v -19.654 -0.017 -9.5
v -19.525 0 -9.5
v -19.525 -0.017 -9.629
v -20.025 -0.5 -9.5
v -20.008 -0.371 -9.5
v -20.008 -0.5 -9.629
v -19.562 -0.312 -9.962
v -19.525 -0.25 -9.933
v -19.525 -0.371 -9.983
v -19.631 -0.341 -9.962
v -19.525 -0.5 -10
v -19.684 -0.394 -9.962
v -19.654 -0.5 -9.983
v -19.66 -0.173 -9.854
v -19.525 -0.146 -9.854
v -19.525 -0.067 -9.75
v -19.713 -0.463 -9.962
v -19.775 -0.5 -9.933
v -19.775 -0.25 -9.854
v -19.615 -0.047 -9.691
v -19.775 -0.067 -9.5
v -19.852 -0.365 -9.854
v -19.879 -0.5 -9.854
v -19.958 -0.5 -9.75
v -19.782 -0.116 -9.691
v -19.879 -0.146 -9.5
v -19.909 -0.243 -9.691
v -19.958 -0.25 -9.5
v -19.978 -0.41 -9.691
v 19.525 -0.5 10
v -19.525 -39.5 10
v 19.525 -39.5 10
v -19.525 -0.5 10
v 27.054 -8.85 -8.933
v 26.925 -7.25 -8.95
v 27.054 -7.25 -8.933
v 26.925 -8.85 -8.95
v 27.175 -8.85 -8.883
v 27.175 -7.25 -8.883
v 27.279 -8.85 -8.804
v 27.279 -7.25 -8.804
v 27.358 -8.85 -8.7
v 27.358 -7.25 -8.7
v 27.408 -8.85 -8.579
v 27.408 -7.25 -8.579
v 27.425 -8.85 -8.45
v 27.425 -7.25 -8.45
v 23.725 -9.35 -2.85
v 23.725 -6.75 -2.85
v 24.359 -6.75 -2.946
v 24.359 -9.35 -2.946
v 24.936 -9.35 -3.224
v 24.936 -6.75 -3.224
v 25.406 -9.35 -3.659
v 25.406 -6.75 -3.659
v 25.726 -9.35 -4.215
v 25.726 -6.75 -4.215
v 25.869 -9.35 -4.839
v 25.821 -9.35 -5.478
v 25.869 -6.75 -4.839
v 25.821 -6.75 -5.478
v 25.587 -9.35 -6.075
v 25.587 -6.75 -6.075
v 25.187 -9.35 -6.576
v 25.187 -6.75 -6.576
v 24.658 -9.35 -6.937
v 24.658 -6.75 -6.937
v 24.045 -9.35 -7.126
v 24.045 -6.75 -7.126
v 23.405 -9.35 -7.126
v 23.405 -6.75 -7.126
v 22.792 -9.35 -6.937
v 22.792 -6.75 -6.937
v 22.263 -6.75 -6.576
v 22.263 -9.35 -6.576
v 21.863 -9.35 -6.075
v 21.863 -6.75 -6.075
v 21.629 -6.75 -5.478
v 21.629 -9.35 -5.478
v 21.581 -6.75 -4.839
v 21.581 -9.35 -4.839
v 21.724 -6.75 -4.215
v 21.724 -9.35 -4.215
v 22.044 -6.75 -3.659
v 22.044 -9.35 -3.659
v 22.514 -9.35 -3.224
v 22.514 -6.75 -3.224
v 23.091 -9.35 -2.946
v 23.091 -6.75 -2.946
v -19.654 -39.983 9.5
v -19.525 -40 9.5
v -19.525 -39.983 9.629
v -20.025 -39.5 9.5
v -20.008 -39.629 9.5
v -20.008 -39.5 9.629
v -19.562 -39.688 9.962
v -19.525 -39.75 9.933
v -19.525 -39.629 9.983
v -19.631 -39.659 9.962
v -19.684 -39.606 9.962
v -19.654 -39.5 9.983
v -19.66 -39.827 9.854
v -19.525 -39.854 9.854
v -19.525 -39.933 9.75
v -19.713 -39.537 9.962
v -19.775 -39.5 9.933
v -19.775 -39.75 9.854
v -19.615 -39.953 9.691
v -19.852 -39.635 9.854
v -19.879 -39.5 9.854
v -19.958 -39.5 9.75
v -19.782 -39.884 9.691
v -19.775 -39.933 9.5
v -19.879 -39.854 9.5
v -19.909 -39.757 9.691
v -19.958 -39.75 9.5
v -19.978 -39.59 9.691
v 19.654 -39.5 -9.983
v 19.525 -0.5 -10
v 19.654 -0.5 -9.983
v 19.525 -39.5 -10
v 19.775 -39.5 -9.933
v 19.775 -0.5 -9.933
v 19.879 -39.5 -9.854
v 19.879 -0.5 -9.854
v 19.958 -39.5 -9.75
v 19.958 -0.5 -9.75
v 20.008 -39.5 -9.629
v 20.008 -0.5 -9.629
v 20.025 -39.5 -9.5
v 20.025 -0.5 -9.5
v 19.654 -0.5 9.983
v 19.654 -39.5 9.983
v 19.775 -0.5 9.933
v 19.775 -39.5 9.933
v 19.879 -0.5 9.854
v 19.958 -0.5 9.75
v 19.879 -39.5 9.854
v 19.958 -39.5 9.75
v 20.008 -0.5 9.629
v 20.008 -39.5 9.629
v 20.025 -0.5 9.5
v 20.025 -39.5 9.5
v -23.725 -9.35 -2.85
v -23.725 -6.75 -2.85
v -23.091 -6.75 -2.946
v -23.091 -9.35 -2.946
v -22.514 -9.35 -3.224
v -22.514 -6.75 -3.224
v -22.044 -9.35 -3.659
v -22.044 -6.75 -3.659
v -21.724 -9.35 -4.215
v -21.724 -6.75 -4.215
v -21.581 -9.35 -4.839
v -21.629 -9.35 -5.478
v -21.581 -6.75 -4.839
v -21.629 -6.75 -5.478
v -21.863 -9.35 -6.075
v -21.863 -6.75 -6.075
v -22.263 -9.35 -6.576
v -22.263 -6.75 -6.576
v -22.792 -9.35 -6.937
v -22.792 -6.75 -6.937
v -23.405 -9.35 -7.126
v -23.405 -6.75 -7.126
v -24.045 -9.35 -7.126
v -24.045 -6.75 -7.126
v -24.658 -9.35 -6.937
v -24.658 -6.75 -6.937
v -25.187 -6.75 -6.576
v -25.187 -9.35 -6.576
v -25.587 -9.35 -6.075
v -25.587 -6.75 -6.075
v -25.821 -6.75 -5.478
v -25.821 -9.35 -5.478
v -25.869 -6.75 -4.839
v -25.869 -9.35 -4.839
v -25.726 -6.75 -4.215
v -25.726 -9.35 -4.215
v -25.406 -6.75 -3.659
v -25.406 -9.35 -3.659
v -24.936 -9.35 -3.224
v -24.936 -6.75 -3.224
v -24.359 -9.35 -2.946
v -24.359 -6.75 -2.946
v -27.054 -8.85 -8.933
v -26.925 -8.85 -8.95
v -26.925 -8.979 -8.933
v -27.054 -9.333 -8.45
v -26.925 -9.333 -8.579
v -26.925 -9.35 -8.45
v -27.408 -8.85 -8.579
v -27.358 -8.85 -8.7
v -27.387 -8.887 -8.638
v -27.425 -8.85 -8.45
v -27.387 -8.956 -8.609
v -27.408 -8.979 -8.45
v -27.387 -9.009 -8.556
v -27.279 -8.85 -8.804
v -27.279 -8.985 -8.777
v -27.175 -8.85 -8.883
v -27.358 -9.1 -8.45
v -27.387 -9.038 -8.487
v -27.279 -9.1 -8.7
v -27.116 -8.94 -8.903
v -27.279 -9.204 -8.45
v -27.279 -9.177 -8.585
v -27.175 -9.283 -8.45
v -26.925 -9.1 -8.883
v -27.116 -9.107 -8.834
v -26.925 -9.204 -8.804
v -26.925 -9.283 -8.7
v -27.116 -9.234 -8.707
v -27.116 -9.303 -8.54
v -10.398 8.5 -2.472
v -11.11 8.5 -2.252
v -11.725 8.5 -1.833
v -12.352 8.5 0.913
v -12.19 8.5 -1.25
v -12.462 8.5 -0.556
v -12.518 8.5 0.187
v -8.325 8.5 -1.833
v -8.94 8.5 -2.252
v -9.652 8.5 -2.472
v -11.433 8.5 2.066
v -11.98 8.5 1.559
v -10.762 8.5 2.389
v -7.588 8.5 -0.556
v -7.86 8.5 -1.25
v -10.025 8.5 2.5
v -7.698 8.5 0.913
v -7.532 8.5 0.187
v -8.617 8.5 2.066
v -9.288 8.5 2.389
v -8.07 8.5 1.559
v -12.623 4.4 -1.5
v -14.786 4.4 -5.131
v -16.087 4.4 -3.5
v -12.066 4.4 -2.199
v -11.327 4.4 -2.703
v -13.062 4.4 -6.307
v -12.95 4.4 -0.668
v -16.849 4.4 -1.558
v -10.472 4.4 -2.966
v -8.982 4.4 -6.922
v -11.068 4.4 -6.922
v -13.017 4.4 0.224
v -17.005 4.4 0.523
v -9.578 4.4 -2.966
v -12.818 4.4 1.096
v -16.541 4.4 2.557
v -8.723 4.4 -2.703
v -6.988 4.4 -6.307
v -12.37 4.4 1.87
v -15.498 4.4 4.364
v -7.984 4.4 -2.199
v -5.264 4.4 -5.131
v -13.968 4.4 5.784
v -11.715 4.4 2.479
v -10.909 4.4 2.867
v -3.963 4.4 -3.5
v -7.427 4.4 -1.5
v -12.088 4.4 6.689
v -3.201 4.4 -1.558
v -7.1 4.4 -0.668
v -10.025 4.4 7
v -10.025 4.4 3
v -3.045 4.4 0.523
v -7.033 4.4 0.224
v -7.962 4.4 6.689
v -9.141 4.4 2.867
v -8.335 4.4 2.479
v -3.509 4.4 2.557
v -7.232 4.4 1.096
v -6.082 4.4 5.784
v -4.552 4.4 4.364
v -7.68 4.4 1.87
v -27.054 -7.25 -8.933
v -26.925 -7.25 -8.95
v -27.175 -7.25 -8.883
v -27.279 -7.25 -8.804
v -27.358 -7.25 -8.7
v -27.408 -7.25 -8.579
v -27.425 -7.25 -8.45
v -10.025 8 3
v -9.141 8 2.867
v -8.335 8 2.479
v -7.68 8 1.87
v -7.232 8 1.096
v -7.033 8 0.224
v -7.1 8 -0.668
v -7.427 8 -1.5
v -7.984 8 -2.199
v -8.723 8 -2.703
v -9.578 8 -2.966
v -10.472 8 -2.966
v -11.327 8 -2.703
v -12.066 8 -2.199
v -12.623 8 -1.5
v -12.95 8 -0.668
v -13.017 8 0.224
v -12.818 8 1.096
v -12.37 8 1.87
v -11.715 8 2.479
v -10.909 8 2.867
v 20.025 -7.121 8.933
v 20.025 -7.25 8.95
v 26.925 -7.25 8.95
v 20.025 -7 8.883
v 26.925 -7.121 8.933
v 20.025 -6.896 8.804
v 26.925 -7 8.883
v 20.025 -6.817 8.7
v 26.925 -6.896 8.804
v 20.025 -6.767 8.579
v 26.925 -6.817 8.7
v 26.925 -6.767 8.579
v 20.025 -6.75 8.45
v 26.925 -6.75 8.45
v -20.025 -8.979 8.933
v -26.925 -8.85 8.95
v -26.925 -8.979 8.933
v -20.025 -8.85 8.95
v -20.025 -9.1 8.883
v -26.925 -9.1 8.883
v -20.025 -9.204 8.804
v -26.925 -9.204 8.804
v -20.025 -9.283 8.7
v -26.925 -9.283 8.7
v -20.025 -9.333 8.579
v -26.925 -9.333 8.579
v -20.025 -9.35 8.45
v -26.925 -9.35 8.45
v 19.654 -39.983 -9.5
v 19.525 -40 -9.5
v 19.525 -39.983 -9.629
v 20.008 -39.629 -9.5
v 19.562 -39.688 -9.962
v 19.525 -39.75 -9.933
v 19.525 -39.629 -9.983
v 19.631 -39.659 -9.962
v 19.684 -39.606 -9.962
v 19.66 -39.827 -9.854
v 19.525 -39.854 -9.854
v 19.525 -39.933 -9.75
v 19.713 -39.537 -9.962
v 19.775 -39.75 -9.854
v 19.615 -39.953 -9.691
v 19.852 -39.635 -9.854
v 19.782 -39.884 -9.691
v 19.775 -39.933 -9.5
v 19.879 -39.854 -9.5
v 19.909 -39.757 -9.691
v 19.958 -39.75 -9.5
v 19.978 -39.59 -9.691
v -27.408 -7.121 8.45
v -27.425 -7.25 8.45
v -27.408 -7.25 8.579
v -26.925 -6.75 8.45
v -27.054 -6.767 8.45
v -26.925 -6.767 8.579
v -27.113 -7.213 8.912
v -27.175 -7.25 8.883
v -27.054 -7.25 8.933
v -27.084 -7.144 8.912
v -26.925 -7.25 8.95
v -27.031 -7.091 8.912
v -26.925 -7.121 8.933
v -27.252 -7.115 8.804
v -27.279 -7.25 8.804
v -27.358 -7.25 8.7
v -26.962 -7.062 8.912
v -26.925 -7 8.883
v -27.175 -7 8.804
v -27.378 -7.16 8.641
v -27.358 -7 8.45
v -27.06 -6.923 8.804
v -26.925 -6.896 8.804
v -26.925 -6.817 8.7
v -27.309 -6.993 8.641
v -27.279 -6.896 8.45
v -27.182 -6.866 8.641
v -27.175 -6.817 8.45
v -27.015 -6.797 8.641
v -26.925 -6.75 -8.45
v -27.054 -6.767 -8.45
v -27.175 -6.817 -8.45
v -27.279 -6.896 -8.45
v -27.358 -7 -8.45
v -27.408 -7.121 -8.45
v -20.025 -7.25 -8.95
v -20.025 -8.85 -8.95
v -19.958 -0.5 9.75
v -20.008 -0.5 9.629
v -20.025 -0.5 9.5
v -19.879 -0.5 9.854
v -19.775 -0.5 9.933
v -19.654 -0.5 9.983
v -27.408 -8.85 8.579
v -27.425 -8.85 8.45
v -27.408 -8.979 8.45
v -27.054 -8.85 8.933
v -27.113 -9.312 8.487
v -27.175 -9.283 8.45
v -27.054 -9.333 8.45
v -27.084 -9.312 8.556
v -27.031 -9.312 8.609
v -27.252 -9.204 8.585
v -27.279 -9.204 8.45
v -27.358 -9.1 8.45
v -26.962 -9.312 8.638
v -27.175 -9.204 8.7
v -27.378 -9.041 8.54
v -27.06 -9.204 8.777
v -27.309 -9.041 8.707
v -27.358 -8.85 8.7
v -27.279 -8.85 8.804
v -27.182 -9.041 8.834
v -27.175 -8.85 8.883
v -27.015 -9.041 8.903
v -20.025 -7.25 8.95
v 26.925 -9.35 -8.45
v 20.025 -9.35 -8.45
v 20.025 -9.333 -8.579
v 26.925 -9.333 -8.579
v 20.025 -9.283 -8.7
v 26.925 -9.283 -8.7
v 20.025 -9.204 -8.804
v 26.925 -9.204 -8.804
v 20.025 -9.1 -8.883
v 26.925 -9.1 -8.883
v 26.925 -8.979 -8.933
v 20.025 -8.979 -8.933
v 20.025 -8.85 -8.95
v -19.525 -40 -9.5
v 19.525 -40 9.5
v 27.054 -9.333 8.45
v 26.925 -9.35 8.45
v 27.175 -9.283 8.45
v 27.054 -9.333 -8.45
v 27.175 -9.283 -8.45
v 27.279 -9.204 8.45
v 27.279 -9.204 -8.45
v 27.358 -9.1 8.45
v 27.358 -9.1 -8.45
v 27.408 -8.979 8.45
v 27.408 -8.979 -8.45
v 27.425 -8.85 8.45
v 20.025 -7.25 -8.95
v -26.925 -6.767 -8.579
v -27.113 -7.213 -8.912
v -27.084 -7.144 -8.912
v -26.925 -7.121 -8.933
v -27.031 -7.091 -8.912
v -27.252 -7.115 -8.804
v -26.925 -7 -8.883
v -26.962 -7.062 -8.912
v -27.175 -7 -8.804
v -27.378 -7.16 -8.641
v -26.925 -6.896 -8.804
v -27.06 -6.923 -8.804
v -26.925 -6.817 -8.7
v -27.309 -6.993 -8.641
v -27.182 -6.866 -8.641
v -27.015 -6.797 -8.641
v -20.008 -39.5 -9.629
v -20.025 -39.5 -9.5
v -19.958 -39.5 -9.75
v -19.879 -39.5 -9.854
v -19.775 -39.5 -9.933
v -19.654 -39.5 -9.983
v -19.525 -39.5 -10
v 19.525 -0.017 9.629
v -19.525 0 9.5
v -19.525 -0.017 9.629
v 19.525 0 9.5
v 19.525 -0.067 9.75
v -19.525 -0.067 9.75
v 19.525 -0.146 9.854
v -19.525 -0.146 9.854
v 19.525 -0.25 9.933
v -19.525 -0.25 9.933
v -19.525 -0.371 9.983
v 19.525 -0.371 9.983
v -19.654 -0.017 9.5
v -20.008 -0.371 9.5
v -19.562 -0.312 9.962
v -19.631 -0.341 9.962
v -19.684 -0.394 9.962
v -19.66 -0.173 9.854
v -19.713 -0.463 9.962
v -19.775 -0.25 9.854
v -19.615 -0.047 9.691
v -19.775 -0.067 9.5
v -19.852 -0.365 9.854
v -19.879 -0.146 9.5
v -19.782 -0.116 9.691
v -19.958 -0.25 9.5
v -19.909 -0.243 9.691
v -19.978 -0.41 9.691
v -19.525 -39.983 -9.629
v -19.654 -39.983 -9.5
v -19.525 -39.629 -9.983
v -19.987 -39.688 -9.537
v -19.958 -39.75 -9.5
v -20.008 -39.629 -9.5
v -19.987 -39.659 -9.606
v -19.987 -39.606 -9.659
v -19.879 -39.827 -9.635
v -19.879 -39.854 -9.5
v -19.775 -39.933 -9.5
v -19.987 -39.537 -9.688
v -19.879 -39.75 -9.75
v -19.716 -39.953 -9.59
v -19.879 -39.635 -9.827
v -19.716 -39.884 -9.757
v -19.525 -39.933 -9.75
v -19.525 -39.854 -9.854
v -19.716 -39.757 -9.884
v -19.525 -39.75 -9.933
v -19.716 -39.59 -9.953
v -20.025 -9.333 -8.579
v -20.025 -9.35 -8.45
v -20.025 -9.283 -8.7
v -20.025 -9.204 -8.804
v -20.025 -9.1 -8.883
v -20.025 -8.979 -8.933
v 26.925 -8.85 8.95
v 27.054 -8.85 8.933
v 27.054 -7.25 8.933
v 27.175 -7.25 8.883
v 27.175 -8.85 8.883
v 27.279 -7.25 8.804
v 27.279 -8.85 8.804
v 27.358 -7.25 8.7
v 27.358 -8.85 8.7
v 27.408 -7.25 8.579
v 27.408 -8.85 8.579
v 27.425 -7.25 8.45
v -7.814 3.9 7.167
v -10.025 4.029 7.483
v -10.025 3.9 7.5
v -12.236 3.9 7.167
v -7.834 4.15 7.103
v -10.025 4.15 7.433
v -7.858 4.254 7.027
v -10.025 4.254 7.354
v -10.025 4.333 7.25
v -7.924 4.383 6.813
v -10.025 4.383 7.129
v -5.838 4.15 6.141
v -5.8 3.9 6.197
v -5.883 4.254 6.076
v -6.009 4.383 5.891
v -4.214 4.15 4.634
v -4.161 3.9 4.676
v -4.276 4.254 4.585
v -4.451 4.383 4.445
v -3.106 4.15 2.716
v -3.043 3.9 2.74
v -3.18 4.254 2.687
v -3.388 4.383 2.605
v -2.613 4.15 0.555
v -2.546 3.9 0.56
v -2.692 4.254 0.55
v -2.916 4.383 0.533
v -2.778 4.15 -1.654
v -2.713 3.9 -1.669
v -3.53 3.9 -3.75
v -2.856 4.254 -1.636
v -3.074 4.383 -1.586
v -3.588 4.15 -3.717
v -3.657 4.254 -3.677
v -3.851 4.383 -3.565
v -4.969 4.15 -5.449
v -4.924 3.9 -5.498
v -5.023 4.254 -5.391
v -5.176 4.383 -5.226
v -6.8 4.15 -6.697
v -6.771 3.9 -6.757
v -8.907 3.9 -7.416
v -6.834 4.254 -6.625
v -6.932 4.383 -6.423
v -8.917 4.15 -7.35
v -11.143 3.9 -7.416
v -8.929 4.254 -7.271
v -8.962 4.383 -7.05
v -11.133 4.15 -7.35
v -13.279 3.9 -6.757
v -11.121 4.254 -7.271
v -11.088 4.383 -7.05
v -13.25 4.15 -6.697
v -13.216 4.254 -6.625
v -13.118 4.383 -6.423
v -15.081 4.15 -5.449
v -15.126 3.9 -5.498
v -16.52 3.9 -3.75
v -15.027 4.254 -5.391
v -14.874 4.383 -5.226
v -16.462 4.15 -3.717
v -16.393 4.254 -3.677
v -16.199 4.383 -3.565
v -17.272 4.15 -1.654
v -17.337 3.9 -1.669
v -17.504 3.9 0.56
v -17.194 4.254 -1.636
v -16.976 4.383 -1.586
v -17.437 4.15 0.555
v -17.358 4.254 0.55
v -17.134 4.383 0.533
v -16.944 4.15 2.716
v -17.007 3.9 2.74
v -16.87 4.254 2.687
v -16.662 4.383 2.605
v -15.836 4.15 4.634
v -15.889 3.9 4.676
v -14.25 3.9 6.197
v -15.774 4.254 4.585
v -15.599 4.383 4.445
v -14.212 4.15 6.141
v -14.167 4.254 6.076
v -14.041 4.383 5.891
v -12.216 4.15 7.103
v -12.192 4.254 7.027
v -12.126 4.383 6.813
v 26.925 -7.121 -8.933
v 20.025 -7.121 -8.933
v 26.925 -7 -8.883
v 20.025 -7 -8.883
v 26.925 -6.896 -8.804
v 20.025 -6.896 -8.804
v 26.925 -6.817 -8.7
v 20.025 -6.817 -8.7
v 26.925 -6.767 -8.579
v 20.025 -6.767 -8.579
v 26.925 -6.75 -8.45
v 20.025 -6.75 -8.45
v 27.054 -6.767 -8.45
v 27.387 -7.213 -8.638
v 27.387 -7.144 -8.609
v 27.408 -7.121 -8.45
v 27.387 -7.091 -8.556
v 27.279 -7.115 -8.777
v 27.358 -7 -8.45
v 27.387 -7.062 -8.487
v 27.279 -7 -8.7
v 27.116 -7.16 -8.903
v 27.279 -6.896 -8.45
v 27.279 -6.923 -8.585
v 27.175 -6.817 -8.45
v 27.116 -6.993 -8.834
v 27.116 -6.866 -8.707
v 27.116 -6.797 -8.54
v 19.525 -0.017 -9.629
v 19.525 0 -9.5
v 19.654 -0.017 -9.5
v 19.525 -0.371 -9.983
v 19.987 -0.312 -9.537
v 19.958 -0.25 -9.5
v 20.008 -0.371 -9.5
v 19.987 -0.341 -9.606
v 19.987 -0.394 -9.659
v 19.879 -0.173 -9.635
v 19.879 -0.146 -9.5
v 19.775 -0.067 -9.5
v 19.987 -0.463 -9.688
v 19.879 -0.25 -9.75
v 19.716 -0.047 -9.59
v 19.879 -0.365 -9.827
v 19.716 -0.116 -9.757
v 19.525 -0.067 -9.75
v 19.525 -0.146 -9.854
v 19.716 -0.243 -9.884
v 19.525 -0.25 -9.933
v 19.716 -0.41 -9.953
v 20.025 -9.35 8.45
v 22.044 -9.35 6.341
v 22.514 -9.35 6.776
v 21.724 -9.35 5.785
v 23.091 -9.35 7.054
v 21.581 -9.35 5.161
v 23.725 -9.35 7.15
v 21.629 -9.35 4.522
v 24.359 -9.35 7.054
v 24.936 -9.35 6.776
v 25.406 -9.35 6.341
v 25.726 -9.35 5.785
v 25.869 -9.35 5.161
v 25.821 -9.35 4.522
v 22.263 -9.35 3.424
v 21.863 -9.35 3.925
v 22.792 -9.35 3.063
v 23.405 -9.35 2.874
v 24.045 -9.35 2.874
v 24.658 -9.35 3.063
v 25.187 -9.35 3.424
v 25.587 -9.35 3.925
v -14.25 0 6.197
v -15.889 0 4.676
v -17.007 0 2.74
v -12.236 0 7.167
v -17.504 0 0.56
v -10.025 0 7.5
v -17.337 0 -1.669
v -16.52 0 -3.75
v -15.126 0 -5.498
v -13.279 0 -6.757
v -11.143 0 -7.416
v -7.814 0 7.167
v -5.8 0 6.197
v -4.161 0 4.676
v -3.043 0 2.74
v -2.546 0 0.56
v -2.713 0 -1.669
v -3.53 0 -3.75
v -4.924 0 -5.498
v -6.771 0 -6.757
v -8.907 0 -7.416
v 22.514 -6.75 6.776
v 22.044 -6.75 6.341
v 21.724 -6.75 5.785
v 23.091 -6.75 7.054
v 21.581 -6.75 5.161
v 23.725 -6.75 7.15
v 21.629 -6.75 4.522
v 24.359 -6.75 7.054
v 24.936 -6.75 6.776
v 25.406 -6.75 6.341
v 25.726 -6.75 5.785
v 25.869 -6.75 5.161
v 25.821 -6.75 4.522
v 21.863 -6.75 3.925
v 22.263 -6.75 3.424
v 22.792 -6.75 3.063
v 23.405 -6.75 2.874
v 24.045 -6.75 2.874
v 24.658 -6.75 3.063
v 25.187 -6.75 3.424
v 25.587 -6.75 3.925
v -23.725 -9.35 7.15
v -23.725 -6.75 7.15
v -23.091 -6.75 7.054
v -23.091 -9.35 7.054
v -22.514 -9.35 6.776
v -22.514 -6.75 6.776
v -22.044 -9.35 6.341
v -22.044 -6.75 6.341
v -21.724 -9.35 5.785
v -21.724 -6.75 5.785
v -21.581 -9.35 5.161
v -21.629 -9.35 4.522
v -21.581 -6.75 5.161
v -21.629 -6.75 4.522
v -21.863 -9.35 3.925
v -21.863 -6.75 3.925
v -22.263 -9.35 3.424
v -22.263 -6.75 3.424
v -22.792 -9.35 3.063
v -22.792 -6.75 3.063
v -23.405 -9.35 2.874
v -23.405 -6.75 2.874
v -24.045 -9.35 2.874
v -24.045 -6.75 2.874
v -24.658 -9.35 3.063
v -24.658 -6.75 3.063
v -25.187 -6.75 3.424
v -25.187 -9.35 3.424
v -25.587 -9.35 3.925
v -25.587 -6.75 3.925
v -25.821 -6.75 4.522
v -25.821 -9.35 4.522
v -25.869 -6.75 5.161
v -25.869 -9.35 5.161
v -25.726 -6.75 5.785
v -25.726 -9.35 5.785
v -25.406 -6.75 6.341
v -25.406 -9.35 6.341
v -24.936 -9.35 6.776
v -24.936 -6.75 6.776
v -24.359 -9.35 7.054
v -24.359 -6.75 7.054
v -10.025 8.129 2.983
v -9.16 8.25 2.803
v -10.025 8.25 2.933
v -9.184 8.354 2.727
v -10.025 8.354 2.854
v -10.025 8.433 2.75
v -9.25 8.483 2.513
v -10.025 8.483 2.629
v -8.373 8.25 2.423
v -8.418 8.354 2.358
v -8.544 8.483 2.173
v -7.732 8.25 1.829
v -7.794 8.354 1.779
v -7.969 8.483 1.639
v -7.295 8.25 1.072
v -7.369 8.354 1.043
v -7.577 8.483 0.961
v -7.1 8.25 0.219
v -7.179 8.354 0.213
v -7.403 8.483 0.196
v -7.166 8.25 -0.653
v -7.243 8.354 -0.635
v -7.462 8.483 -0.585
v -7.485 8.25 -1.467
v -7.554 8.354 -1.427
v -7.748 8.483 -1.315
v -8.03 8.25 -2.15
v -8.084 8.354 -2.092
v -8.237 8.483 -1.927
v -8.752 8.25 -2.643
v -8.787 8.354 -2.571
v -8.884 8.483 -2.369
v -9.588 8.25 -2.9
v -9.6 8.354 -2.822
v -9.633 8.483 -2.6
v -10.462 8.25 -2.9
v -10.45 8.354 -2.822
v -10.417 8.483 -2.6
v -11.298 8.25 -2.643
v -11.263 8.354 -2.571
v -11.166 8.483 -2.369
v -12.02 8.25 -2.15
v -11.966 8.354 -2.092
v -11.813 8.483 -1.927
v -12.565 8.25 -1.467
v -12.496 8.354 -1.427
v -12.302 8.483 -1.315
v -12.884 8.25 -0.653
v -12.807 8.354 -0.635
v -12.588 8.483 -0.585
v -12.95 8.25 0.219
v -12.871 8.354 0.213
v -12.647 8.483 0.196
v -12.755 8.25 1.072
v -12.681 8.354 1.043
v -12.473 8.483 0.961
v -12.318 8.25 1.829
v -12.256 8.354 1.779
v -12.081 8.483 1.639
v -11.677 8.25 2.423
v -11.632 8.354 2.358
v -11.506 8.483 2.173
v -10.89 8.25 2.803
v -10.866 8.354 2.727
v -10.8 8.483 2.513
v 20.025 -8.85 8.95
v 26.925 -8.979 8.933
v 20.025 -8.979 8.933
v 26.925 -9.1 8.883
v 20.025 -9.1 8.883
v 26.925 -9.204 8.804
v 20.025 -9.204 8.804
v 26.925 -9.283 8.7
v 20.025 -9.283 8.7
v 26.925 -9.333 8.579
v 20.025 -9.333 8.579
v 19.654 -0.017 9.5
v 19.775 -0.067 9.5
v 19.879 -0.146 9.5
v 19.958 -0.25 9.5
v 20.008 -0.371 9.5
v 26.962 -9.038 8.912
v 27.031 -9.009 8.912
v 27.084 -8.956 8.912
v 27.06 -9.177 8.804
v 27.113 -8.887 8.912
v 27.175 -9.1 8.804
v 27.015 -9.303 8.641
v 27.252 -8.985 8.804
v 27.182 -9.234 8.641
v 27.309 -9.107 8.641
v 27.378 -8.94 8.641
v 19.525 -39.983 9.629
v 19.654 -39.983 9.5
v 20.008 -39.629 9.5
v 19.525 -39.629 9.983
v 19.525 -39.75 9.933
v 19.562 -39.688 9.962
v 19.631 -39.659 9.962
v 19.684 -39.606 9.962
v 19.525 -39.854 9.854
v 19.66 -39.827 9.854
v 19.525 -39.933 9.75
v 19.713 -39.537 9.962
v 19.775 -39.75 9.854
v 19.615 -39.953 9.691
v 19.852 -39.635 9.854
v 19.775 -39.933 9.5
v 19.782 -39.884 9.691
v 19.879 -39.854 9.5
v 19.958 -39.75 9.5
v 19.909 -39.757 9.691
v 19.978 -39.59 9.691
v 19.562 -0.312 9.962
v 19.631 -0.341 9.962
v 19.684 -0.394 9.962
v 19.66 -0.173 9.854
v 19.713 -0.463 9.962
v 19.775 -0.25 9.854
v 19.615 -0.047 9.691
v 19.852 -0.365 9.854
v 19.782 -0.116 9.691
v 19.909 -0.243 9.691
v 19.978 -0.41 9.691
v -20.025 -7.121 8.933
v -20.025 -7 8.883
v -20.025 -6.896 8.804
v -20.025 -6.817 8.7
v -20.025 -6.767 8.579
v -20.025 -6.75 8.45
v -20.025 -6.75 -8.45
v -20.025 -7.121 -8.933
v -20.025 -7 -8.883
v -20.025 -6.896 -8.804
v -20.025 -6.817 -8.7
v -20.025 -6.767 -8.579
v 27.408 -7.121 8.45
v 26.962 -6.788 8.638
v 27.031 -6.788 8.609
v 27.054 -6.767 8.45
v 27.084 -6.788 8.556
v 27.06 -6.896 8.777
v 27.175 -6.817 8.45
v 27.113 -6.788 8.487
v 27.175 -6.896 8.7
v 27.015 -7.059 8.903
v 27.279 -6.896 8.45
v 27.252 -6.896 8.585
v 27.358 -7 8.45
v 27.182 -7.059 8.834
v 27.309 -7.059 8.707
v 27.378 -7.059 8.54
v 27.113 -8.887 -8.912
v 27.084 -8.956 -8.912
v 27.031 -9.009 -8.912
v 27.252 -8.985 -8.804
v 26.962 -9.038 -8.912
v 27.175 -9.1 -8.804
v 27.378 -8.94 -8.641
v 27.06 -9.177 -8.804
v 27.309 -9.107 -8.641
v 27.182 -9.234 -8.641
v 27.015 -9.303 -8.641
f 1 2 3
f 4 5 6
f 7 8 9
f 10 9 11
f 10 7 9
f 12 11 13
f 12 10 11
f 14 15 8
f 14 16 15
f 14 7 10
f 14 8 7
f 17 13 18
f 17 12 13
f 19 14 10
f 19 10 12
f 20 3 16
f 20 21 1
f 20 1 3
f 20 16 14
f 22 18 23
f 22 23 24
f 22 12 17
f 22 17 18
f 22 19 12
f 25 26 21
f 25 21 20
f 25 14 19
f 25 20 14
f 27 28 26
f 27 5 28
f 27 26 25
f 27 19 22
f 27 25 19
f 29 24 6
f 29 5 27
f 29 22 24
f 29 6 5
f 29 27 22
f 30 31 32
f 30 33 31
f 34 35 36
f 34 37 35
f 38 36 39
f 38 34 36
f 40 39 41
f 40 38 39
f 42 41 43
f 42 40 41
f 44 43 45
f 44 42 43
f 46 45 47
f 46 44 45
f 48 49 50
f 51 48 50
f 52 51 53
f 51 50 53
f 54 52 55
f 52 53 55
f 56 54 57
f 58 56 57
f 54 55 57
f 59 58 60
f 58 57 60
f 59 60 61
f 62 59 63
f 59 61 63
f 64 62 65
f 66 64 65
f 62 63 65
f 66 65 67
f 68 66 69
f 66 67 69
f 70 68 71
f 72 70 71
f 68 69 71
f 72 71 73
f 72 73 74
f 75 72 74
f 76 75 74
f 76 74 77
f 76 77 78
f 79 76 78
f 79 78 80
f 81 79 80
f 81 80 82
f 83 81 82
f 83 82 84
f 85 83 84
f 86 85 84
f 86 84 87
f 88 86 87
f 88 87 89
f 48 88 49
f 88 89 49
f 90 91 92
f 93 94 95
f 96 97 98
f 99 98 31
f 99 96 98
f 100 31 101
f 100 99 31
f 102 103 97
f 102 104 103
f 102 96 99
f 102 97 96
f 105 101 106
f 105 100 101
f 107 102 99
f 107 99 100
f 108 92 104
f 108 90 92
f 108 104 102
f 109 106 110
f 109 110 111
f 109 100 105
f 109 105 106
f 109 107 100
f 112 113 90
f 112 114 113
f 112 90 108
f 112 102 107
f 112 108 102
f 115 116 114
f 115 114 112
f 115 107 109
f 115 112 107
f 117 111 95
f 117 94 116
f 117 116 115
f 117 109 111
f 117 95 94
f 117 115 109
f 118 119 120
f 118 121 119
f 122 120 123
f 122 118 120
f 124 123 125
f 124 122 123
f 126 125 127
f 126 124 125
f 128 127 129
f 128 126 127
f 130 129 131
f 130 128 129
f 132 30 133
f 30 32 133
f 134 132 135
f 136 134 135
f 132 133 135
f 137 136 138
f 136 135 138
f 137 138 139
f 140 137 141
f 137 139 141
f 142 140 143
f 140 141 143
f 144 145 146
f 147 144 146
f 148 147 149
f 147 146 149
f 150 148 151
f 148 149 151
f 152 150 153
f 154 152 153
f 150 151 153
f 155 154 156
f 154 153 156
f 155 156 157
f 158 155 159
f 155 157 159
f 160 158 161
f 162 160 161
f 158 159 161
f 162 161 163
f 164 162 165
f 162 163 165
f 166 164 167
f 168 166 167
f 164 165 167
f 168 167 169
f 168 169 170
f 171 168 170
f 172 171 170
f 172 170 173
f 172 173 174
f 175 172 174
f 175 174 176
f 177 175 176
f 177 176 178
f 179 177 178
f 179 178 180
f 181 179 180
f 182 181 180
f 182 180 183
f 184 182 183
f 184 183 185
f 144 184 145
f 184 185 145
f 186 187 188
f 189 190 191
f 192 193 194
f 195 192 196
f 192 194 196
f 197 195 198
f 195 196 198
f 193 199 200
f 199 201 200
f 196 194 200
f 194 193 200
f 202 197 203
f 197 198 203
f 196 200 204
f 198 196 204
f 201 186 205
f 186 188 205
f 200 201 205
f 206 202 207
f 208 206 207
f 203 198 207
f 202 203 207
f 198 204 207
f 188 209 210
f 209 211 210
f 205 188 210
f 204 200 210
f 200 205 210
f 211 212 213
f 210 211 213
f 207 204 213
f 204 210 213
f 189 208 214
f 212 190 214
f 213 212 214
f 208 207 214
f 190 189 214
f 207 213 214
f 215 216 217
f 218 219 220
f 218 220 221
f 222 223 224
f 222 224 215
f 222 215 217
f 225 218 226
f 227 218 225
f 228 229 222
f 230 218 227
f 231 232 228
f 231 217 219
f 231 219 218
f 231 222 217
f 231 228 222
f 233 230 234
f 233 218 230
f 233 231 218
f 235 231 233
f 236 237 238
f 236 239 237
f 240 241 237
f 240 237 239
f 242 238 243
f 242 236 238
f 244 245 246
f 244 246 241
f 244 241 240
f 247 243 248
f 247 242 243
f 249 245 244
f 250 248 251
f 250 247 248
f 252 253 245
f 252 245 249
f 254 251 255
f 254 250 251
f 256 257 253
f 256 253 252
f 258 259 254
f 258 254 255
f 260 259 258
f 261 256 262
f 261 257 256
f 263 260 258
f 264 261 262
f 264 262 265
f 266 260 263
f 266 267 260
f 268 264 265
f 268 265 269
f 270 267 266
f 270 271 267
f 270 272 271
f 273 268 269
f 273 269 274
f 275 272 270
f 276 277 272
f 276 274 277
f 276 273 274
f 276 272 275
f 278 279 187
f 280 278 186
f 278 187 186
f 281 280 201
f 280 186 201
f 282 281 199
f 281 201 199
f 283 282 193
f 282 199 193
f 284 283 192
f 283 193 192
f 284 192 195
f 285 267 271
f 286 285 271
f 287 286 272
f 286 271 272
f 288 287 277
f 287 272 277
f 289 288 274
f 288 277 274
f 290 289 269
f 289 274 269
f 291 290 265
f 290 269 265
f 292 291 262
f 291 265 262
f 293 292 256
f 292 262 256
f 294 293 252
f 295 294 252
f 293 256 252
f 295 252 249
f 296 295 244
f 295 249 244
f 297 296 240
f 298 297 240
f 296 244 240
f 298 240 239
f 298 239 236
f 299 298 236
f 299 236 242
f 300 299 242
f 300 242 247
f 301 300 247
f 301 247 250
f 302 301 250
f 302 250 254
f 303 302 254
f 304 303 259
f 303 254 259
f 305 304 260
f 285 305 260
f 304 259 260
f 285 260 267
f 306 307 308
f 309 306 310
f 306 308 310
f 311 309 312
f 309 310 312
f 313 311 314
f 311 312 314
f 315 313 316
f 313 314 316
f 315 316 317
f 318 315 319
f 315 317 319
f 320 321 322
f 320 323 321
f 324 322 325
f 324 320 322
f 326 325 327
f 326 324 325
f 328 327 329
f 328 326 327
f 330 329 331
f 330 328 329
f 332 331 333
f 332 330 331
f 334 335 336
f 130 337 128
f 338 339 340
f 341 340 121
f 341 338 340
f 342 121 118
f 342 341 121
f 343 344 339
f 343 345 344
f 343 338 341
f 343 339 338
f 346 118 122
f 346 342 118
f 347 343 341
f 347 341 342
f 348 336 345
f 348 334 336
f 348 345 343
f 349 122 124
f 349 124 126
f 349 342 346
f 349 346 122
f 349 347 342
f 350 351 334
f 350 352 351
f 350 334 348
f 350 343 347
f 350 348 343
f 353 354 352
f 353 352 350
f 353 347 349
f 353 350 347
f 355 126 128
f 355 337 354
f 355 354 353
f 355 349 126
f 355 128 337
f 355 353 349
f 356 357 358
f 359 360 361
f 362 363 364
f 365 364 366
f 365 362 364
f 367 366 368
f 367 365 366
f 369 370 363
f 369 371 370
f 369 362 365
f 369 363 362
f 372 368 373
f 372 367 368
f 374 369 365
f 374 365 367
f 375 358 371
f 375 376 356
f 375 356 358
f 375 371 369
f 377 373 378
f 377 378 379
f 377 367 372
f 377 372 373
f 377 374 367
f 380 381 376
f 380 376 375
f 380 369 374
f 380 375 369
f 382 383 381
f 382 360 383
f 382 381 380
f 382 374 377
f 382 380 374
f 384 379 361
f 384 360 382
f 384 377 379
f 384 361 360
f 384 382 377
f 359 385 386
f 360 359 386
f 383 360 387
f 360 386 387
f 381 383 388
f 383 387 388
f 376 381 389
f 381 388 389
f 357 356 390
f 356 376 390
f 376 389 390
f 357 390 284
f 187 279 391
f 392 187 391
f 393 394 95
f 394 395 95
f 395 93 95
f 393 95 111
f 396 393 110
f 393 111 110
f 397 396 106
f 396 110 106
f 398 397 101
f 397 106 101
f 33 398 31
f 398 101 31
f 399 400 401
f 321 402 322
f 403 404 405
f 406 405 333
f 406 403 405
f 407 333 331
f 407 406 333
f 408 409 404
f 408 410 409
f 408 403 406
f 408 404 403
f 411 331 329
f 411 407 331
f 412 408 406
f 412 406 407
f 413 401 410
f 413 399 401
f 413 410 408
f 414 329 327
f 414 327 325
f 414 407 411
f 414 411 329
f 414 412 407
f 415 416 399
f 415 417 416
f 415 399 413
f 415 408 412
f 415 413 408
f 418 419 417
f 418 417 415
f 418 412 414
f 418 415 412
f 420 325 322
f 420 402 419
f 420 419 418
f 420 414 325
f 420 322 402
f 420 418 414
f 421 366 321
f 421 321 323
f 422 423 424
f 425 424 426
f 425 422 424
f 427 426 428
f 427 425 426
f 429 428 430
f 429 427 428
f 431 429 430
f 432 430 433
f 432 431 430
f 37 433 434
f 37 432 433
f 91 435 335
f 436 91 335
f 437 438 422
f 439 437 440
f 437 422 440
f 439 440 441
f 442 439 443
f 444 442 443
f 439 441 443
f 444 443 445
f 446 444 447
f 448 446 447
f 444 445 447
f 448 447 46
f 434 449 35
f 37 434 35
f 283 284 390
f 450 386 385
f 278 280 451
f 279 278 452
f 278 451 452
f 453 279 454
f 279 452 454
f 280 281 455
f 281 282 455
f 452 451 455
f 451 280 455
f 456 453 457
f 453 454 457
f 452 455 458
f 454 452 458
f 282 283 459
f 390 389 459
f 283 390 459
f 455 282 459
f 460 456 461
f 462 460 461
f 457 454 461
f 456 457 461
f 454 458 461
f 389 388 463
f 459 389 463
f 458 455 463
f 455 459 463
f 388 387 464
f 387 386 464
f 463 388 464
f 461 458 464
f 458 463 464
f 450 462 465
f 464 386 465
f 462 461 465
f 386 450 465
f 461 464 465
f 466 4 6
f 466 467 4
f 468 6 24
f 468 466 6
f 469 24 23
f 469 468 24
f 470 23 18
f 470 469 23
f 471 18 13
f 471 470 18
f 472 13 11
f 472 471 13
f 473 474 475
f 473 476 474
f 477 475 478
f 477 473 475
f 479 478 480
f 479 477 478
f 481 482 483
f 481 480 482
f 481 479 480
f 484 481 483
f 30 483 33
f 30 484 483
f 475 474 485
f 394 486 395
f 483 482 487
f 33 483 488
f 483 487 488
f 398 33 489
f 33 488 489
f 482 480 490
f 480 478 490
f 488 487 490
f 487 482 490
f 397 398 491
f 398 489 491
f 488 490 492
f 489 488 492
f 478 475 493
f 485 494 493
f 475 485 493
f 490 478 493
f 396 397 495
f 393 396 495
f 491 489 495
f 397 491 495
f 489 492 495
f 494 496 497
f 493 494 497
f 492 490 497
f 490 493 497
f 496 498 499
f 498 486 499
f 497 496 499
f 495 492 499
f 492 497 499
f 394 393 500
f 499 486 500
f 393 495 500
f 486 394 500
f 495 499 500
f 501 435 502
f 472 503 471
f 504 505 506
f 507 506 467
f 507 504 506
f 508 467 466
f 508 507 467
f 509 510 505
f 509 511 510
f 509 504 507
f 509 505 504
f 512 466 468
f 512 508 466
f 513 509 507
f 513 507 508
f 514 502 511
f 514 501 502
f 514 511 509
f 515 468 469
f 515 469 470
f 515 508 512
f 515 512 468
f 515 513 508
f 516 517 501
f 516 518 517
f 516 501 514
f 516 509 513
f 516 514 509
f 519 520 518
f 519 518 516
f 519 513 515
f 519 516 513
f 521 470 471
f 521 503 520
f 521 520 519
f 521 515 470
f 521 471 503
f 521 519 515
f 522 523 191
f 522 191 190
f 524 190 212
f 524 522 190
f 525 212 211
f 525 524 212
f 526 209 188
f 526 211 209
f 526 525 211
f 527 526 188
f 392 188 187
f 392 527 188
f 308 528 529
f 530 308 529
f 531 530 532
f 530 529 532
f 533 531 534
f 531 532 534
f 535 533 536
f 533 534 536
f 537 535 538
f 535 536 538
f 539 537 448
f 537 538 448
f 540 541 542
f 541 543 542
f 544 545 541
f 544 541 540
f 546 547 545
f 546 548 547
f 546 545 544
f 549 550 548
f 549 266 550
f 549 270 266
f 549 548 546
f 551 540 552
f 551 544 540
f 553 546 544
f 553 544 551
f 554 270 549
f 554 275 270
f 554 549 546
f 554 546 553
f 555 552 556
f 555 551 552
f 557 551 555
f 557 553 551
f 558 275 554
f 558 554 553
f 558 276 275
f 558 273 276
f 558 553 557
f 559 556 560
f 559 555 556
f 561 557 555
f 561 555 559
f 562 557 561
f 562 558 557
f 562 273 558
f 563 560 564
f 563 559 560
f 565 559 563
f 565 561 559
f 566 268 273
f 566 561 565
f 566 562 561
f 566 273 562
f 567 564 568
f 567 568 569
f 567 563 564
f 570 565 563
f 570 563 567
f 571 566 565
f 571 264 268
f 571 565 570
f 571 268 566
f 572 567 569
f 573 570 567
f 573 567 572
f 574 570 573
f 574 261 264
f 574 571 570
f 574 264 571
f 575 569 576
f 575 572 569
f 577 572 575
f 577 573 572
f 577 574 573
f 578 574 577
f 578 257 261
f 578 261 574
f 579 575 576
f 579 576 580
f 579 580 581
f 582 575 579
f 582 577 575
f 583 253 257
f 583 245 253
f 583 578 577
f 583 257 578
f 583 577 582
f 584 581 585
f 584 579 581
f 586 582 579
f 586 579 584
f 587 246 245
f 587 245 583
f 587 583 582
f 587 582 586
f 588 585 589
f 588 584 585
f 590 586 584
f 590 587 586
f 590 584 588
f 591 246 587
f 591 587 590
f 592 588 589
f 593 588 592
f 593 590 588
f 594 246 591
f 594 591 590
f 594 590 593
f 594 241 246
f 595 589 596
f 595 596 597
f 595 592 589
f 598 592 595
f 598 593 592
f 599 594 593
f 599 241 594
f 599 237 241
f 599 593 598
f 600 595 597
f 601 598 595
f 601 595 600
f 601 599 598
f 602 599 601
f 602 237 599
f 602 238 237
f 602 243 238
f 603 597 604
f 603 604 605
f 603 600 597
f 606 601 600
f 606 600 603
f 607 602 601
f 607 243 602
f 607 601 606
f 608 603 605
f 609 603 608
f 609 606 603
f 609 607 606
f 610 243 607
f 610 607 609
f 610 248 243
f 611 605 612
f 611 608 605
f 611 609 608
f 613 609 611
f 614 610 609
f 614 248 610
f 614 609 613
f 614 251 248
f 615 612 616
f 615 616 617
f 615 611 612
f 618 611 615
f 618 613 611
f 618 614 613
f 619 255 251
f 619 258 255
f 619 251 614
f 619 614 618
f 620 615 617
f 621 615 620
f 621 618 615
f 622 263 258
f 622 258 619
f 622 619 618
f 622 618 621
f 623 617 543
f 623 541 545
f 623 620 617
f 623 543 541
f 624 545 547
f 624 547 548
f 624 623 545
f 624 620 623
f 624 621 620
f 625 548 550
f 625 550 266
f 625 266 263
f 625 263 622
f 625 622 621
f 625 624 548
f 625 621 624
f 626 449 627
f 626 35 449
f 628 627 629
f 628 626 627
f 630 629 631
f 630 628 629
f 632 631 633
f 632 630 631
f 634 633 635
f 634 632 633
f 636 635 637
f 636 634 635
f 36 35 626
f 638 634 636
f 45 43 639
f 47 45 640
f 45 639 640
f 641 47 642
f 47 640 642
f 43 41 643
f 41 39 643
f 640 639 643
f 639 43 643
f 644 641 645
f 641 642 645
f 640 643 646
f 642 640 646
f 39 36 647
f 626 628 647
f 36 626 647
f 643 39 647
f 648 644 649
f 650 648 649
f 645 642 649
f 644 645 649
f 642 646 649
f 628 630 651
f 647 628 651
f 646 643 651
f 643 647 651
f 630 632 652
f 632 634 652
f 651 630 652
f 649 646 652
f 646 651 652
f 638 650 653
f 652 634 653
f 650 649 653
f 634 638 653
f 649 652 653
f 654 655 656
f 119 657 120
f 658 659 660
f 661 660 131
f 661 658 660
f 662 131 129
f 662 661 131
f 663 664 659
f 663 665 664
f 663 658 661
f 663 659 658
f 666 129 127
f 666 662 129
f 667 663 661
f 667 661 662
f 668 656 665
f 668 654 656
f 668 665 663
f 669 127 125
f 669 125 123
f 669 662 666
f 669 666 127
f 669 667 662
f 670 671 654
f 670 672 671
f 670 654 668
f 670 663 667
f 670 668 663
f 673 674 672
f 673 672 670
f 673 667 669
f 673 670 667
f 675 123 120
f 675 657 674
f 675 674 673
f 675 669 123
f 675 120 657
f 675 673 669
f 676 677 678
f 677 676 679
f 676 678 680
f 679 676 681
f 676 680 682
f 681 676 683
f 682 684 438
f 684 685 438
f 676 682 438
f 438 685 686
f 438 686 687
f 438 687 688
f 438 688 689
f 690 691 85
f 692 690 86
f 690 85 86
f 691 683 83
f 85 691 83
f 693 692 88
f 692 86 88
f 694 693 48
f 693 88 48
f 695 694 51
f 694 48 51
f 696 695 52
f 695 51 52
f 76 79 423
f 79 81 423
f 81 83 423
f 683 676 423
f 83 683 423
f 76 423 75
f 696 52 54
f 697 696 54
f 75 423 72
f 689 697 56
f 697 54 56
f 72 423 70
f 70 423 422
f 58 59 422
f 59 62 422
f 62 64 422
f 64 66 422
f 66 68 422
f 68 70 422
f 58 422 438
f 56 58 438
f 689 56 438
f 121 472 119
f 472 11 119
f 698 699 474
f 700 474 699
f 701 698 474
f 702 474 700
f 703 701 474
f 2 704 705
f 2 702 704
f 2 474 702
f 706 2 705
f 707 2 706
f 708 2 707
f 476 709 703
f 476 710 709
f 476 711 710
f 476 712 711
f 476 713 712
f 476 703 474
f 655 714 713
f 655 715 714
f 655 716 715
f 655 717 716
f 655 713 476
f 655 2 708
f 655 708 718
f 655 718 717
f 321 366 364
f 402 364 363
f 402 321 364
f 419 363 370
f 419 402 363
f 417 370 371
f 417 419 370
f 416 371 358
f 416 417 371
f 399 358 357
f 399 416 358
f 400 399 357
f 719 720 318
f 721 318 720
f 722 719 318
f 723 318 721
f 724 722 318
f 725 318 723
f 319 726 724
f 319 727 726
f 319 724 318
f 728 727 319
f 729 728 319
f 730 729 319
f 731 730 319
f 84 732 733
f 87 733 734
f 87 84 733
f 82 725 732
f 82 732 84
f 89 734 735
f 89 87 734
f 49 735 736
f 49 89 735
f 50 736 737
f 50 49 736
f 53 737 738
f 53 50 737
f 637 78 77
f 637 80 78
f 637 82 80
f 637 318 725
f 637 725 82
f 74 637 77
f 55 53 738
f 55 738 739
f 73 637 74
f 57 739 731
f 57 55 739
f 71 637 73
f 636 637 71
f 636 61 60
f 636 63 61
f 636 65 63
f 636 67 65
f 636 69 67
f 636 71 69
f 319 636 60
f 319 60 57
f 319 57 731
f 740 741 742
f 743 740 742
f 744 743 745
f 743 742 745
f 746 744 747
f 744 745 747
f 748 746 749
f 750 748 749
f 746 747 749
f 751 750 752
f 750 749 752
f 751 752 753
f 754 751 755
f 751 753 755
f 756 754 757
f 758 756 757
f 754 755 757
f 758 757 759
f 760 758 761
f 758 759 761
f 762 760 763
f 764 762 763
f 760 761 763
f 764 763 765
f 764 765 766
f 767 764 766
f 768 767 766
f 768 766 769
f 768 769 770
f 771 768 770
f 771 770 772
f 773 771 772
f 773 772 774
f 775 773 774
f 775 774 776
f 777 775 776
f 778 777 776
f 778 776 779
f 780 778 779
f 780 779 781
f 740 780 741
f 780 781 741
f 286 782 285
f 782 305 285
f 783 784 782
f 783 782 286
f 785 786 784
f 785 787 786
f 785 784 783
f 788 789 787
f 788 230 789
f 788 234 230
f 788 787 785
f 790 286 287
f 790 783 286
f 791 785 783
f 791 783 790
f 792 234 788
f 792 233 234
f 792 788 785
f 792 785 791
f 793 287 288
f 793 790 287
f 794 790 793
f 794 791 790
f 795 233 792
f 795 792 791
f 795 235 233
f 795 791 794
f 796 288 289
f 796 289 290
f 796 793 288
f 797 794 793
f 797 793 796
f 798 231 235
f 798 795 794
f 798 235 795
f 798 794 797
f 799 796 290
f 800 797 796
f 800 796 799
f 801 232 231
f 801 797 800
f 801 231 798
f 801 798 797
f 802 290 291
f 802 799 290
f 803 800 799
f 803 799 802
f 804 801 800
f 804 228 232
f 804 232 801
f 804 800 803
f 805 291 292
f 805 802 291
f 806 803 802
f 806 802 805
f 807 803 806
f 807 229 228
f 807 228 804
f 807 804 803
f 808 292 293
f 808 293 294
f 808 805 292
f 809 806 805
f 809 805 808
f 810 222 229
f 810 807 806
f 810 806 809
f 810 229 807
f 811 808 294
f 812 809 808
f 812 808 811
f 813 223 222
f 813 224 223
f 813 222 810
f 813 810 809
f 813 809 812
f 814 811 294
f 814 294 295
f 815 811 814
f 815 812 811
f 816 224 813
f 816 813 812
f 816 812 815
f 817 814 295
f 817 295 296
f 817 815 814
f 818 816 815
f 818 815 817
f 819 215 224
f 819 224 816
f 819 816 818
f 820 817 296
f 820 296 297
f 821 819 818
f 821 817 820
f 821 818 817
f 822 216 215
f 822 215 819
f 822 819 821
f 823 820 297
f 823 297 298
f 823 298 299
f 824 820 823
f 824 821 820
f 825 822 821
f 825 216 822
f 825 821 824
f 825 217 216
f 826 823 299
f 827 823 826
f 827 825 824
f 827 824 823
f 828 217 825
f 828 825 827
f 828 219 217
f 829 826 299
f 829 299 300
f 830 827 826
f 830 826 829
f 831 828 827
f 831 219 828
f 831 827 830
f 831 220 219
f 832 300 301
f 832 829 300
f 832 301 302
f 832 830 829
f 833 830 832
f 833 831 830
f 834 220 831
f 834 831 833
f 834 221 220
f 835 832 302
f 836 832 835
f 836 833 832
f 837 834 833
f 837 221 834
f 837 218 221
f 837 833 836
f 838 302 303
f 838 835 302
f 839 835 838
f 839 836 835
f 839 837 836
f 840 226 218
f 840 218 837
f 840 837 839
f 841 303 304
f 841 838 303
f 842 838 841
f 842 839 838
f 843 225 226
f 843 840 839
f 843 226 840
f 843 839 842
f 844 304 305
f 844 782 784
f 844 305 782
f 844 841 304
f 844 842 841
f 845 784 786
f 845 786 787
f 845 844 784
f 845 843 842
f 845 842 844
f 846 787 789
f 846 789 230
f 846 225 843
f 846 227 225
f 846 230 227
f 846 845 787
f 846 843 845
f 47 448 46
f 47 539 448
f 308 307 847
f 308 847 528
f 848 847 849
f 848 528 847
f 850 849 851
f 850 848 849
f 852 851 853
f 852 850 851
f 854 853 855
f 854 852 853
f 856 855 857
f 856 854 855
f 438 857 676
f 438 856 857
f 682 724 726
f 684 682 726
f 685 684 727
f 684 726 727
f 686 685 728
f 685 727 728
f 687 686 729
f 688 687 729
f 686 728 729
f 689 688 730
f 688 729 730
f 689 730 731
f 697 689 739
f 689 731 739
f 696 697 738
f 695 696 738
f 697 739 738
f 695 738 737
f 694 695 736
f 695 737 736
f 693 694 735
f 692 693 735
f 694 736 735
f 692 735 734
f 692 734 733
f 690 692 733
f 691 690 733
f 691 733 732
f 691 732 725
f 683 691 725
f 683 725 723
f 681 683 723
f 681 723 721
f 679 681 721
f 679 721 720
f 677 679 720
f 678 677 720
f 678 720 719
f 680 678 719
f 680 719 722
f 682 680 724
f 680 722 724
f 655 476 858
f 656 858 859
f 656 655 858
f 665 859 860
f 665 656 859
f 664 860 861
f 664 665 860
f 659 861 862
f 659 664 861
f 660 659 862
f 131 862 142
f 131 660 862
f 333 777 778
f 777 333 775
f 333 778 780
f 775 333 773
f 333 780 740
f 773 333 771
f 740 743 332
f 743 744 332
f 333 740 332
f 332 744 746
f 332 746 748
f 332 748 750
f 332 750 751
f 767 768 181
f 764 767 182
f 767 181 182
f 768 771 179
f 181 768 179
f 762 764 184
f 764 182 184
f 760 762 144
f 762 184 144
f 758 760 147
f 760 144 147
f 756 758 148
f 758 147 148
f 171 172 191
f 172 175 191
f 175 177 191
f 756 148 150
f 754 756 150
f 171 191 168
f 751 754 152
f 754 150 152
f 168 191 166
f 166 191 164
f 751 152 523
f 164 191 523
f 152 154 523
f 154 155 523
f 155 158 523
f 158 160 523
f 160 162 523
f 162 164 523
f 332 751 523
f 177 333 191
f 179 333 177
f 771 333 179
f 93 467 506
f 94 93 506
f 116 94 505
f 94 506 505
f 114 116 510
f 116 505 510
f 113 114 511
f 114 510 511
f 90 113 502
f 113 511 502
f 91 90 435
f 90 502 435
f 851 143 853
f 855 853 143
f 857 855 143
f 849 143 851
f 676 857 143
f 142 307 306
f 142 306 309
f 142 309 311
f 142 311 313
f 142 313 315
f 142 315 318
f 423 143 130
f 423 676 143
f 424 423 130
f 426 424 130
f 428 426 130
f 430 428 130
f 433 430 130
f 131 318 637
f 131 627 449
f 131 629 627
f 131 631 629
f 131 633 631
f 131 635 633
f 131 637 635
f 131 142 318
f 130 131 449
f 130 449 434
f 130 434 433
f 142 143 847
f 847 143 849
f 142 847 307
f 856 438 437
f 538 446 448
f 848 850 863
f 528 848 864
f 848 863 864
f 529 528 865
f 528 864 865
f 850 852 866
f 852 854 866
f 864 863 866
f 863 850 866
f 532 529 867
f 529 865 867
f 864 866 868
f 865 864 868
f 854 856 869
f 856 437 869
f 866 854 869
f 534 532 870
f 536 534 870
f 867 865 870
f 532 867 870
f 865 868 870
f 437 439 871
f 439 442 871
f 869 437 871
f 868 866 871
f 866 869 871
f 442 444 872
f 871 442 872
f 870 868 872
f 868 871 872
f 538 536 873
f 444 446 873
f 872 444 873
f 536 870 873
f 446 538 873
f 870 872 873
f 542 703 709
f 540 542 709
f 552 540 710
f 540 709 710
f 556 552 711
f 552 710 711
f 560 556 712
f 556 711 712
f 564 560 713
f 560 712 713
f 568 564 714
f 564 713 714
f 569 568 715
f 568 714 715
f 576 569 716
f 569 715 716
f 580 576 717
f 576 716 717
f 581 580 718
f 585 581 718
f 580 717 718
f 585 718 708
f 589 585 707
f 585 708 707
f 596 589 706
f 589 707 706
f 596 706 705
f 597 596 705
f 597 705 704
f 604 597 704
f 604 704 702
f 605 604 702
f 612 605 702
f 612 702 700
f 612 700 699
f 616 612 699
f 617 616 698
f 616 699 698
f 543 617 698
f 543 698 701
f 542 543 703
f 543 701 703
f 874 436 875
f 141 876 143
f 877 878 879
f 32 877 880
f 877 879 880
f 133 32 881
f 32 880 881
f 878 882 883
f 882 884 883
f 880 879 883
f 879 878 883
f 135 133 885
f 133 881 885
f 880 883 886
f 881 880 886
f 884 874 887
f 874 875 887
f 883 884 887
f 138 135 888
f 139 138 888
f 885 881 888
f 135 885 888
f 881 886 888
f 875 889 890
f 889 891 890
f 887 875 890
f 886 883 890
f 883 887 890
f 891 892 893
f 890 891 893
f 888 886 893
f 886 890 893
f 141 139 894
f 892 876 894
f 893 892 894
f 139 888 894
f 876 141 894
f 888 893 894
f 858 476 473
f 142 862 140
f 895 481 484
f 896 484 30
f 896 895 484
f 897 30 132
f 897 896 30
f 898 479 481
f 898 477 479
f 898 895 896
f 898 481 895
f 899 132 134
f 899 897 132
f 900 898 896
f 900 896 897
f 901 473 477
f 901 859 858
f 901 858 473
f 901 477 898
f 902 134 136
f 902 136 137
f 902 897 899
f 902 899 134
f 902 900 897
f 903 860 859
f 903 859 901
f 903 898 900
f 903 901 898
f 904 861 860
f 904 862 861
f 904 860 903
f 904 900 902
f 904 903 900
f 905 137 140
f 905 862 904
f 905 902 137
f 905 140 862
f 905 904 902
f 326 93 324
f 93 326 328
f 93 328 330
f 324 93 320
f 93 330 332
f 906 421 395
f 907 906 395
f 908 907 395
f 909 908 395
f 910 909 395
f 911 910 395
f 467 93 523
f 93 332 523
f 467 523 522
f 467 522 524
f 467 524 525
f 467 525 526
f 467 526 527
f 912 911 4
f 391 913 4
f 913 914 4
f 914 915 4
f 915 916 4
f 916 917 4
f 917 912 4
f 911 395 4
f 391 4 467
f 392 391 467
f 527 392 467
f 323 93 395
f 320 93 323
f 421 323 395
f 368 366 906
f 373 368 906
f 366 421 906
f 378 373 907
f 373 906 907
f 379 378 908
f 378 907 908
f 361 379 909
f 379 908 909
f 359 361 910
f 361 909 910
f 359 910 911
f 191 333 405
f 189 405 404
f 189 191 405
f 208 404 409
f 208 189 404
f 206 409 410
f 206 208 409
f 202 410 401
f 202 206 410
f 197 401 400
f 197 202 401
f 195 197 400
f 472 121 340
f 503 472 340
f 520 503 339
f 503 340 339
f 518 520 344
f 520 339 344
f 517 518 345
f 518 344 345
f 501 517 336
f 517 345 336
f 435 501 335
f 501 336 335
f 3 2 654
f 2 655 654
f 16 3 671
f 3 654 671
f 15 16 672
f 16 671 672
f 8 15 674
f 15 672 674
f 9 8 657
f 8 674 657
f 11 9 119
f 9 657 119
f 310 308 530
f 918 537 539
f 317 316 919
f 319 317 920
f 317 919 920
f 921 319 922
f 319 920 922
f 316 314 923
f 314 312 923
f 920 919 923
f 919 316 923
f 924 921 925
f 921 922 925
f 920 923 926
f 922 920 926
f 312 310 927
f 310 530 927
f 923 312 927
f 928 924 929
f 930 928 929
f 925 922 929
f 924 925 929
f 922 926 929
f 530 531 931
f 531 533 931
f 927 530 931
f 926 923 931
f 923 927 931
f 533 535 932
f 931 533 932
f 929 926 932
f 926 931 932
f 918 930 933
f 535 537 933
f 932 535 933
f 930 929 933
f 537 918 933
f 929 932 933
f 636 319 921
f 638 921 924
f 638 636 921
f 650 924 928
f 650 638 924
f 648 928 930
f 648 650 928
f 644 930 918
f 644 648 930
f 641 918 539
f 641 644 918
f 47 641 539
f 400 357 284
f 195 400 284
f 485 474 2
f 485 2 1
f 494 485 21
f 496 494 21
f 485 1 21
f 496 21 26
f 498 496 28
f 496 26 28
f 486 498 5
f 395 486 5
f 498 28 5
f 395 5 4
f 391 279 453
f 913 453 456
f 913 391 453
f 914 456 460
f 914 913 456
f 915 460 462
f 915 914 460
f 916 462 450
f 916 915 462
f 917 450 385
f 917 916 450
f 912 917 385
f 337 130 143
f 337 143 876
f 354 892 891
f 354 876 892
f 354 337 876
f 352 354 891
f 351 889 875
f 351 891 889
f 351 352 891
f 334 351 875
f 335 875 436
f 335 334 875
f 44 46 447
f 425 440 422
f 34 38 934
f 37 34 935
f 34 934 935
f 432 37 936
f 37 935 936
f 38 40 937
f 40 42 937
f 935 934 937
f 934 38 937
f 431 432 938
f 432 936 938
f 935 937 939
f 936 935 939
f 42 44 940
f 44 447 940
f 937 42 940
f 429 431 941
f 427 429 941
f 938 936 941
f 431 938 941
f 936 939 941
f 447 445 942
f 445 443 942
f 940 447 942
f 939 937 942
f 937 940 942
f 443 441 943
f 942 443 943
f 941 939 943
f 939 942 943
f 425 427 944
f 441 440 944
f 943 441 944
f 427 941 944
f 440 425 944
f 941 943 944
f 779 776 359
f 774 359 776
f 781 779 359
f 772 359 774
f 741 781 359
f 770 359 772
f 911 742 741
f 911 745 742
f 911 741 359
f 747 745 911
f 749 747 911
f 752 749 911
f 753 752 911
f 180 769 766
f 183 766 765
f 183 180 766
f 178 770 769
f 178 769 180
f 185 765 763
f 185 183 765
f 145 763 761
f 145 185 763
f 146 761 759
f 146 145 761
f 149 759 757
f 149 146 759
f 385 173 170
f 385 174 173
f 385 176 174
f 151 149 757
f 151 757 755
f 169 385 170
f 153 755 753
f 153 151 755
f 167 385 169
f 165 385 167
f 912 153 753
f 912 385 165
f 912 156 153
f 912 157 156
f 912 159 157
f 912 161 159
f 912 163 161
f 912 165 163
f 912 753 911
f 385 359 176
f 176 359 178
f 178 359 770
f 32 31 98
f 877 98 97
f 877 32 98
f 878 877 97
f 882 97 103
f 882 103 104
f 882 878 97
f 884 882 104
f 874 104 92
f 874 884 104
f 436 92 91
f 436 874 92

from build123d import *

# Parameters (mm, degrees)
SKETCH1_W           = 40.05
SKETCH1_H           = 20
SKETCH1_R           = 7.5
SKETCH1_R_2         = 3
BOSS_EXTRUDE1_DEPTH = 40
BOSS_EXTRUDE2_START = -6.75
SKETCH1_3_W         = 7.4
SKETCH1_3_H         = 17.9
SKETCH1_3_R         = 2.15
BOSS_EXTRUDE2_DEPTH = 2.6
SKETCH1_4_R         = 7.5
SKETCH1_4_R_2       = 3
BOSS_EXTRUDE3_DEPTH = 4.4
BOSS_EXTRUDE4_START = 4.4
SKETCH1_5_R         = 3
BOSS_EXTRUDE4_DEPTH = 4.1
FILLET1_R           = 0.5


with BuildPart() as part:
    # Sketch1 → Boss-Extrude1 (new body)
    # profile 1 of 3: a face of its own
    with BuildSketch(Plane(origin=(0, 0, 0), x_dir=(1, 0, 0), z_dir=(0, 1, 0))):
        Rectangle(SKETCH1_W, SKETCH1_H)
        with Locations((-10.025, 0)):
            Circle(SKETCH1_R, mode=Mode.SUBTRACT)
    # profile 2 of 3: a face of its own
    with BuildSketch(Plane(origin=(0, 0, 0), x_dir=(1, 0, 0), z_dir=(0, 1, 0))):
        with Locations((-10.025, 0)):
            Circle(SKETCH1_R)
        with Locations((-10.025, 0)):
            Circle(SKETCH1_R_2, mode=Mode.SUBTRACT)
    # profile 3 of 3: a face of its own
    with BuildSketch(Plane(origin=(0, 0, 0), x_dir=(1, 0, 0), z_dir=(0, 1, 0))):
        with Locations((-10.025, 0)):
            Circle(SKETCH1_R_2)
    extrude(amount=-BOSS_EXTRUDE1_DEPTH)

    # Sketch1<3> → Boss-Extrude2 (add)
    # profile 1 of 2: a face of its own
    with BuildSketch(Plane(origin=(0, 0, 0), x_dir=(1, 0, 0), z_dir=(0, 1, 0)).offset(BOSS_EXTRUDE2_START)):
        with Locations((-23.725, 0)):
            Rectangle(SKETCH1_3_W, SKETCH1_3_H)
        with Locations(Location((-23.725, -5, 0), (0, 0, 270))):
            Circle(SKETCH1_3_R, mode=Mode.SUBTRACT)
        with Locations(Location((-23.725, 5, 0), (0, 0, 270))):
            Circle(SKETCH1_3_R, mode=Mode.SUBTRACT)
    # profile 2 of 2: a face of its own
    with BuildSketch(Plane(origin=(0, 0, 0), x_dir=(1, 0, 0), z_dir=(0, 1, 0)).offset(BOSS_EXTRUDE2_START)):
        with Locations((23.725, 0)):
            Rectangle(SKETCH1_3_W, SKETCH1_3_H)
        with Locations(Location((23.725, -5, 0), (0, 0, 270))):
            Circle(SKETCH1_3_R, mode=Mode.SUBTRACT)
        with Locations(Location((23.725, 5, 0), (0, 0, 270))):
            Circle(SKETCH1_3_R, mode=Mode.SUBTRACT)
    extrude(amount=-BOSS_EXTRUDE2_DEPTH)

    # Sketch1<4> → Boss-Extrude3 (add)
    # profile 1 of 2: a face of its own
    with BuildSketch(Plane(origin=(0, 0, 0), x_dir=(1, 0, 0), z_dir=(0, 1, 0))):
        with Locations(Location((-10.025, 0, 0), (0, 0, 270))):
            Circle(SKETCH1_4_R)
        with Locations((-10.025, 0)):
            Circle(SKETCH1_4_R_2, mode=Mode.SUBTRACT)
    # profile 2 of 2: a face of its own
    with BuildSketch(Plane(origin=(0, 0, 0), x_dir=(1, 0, 0), z_dir=(0, 1, 0))):
        with Locations((-10.025, 0)):
            Circle(SKETCH1_4_R_2)
    extrude(amount=BOSS_EXTRUDE3_DEPTH)

    # Sketch1<5> → Boss-Extrude4 (add)
    with BuildSketch(Plane(origin=(0, 0, 0), x_dir=(1, 0, 0), z_dir=(0, 1, 0)).offset(BOSS_EXTRUDE4_START)):
        with Locations(Location((-10.025, 0, 0), (0, 0, 270))):
            Circle(SKETCH1_5_R)
    extrude(amount=BOSS_EXTRUDE4_DEPTH)

    # Fillet1
    fillet1_edges = [part.edges().sort_by_distance(p)[0] for p in [
        (20.025, -40, 0),
        (0, -40, -10),
        (-27.425, -6.75, 0),
        (-27.425, -8.05, 8.95),
        (-23.725, -9.35, -8.95),
        (-27.425, -8.05, -8.95),
        (-23.725, -6.75, 8.95),
        (-20.025, -40, 0),
        (-27.425, -9.35, 0),
        (-23.725, -9.35, 8.95),
        (-23.725, -6.75, -8.95),
        (23.725, -6.75, -8.95),
        (27.425, -9.35, 0),
        (27.425, -8.05, -8.95),
        (23.725, -9.35, 8.95),
        (27.425, -8.05, 8.95),
        (23.725, -9.35, -8.95),
        (23.725, -6.75, 8.95),
        (27.425, -6.75, 0),
        (0, -40, 10),
        (-10.025, 4.4, -7.5),
        (-10.025, 8.5, -3),
        (-20.025, 0, 0),
        (0, 0, -10),
        (20.025, 0, 0),
        (0, 0, 10),
        (-20.025, -20, 10),
        (-20.025, -20, -10),
        (20.025, -20, -10),
        (20.025, -20, 10),
    ]]
    fillet(fillet1_edges, radius=FILLET1_R)


solid = part.part
